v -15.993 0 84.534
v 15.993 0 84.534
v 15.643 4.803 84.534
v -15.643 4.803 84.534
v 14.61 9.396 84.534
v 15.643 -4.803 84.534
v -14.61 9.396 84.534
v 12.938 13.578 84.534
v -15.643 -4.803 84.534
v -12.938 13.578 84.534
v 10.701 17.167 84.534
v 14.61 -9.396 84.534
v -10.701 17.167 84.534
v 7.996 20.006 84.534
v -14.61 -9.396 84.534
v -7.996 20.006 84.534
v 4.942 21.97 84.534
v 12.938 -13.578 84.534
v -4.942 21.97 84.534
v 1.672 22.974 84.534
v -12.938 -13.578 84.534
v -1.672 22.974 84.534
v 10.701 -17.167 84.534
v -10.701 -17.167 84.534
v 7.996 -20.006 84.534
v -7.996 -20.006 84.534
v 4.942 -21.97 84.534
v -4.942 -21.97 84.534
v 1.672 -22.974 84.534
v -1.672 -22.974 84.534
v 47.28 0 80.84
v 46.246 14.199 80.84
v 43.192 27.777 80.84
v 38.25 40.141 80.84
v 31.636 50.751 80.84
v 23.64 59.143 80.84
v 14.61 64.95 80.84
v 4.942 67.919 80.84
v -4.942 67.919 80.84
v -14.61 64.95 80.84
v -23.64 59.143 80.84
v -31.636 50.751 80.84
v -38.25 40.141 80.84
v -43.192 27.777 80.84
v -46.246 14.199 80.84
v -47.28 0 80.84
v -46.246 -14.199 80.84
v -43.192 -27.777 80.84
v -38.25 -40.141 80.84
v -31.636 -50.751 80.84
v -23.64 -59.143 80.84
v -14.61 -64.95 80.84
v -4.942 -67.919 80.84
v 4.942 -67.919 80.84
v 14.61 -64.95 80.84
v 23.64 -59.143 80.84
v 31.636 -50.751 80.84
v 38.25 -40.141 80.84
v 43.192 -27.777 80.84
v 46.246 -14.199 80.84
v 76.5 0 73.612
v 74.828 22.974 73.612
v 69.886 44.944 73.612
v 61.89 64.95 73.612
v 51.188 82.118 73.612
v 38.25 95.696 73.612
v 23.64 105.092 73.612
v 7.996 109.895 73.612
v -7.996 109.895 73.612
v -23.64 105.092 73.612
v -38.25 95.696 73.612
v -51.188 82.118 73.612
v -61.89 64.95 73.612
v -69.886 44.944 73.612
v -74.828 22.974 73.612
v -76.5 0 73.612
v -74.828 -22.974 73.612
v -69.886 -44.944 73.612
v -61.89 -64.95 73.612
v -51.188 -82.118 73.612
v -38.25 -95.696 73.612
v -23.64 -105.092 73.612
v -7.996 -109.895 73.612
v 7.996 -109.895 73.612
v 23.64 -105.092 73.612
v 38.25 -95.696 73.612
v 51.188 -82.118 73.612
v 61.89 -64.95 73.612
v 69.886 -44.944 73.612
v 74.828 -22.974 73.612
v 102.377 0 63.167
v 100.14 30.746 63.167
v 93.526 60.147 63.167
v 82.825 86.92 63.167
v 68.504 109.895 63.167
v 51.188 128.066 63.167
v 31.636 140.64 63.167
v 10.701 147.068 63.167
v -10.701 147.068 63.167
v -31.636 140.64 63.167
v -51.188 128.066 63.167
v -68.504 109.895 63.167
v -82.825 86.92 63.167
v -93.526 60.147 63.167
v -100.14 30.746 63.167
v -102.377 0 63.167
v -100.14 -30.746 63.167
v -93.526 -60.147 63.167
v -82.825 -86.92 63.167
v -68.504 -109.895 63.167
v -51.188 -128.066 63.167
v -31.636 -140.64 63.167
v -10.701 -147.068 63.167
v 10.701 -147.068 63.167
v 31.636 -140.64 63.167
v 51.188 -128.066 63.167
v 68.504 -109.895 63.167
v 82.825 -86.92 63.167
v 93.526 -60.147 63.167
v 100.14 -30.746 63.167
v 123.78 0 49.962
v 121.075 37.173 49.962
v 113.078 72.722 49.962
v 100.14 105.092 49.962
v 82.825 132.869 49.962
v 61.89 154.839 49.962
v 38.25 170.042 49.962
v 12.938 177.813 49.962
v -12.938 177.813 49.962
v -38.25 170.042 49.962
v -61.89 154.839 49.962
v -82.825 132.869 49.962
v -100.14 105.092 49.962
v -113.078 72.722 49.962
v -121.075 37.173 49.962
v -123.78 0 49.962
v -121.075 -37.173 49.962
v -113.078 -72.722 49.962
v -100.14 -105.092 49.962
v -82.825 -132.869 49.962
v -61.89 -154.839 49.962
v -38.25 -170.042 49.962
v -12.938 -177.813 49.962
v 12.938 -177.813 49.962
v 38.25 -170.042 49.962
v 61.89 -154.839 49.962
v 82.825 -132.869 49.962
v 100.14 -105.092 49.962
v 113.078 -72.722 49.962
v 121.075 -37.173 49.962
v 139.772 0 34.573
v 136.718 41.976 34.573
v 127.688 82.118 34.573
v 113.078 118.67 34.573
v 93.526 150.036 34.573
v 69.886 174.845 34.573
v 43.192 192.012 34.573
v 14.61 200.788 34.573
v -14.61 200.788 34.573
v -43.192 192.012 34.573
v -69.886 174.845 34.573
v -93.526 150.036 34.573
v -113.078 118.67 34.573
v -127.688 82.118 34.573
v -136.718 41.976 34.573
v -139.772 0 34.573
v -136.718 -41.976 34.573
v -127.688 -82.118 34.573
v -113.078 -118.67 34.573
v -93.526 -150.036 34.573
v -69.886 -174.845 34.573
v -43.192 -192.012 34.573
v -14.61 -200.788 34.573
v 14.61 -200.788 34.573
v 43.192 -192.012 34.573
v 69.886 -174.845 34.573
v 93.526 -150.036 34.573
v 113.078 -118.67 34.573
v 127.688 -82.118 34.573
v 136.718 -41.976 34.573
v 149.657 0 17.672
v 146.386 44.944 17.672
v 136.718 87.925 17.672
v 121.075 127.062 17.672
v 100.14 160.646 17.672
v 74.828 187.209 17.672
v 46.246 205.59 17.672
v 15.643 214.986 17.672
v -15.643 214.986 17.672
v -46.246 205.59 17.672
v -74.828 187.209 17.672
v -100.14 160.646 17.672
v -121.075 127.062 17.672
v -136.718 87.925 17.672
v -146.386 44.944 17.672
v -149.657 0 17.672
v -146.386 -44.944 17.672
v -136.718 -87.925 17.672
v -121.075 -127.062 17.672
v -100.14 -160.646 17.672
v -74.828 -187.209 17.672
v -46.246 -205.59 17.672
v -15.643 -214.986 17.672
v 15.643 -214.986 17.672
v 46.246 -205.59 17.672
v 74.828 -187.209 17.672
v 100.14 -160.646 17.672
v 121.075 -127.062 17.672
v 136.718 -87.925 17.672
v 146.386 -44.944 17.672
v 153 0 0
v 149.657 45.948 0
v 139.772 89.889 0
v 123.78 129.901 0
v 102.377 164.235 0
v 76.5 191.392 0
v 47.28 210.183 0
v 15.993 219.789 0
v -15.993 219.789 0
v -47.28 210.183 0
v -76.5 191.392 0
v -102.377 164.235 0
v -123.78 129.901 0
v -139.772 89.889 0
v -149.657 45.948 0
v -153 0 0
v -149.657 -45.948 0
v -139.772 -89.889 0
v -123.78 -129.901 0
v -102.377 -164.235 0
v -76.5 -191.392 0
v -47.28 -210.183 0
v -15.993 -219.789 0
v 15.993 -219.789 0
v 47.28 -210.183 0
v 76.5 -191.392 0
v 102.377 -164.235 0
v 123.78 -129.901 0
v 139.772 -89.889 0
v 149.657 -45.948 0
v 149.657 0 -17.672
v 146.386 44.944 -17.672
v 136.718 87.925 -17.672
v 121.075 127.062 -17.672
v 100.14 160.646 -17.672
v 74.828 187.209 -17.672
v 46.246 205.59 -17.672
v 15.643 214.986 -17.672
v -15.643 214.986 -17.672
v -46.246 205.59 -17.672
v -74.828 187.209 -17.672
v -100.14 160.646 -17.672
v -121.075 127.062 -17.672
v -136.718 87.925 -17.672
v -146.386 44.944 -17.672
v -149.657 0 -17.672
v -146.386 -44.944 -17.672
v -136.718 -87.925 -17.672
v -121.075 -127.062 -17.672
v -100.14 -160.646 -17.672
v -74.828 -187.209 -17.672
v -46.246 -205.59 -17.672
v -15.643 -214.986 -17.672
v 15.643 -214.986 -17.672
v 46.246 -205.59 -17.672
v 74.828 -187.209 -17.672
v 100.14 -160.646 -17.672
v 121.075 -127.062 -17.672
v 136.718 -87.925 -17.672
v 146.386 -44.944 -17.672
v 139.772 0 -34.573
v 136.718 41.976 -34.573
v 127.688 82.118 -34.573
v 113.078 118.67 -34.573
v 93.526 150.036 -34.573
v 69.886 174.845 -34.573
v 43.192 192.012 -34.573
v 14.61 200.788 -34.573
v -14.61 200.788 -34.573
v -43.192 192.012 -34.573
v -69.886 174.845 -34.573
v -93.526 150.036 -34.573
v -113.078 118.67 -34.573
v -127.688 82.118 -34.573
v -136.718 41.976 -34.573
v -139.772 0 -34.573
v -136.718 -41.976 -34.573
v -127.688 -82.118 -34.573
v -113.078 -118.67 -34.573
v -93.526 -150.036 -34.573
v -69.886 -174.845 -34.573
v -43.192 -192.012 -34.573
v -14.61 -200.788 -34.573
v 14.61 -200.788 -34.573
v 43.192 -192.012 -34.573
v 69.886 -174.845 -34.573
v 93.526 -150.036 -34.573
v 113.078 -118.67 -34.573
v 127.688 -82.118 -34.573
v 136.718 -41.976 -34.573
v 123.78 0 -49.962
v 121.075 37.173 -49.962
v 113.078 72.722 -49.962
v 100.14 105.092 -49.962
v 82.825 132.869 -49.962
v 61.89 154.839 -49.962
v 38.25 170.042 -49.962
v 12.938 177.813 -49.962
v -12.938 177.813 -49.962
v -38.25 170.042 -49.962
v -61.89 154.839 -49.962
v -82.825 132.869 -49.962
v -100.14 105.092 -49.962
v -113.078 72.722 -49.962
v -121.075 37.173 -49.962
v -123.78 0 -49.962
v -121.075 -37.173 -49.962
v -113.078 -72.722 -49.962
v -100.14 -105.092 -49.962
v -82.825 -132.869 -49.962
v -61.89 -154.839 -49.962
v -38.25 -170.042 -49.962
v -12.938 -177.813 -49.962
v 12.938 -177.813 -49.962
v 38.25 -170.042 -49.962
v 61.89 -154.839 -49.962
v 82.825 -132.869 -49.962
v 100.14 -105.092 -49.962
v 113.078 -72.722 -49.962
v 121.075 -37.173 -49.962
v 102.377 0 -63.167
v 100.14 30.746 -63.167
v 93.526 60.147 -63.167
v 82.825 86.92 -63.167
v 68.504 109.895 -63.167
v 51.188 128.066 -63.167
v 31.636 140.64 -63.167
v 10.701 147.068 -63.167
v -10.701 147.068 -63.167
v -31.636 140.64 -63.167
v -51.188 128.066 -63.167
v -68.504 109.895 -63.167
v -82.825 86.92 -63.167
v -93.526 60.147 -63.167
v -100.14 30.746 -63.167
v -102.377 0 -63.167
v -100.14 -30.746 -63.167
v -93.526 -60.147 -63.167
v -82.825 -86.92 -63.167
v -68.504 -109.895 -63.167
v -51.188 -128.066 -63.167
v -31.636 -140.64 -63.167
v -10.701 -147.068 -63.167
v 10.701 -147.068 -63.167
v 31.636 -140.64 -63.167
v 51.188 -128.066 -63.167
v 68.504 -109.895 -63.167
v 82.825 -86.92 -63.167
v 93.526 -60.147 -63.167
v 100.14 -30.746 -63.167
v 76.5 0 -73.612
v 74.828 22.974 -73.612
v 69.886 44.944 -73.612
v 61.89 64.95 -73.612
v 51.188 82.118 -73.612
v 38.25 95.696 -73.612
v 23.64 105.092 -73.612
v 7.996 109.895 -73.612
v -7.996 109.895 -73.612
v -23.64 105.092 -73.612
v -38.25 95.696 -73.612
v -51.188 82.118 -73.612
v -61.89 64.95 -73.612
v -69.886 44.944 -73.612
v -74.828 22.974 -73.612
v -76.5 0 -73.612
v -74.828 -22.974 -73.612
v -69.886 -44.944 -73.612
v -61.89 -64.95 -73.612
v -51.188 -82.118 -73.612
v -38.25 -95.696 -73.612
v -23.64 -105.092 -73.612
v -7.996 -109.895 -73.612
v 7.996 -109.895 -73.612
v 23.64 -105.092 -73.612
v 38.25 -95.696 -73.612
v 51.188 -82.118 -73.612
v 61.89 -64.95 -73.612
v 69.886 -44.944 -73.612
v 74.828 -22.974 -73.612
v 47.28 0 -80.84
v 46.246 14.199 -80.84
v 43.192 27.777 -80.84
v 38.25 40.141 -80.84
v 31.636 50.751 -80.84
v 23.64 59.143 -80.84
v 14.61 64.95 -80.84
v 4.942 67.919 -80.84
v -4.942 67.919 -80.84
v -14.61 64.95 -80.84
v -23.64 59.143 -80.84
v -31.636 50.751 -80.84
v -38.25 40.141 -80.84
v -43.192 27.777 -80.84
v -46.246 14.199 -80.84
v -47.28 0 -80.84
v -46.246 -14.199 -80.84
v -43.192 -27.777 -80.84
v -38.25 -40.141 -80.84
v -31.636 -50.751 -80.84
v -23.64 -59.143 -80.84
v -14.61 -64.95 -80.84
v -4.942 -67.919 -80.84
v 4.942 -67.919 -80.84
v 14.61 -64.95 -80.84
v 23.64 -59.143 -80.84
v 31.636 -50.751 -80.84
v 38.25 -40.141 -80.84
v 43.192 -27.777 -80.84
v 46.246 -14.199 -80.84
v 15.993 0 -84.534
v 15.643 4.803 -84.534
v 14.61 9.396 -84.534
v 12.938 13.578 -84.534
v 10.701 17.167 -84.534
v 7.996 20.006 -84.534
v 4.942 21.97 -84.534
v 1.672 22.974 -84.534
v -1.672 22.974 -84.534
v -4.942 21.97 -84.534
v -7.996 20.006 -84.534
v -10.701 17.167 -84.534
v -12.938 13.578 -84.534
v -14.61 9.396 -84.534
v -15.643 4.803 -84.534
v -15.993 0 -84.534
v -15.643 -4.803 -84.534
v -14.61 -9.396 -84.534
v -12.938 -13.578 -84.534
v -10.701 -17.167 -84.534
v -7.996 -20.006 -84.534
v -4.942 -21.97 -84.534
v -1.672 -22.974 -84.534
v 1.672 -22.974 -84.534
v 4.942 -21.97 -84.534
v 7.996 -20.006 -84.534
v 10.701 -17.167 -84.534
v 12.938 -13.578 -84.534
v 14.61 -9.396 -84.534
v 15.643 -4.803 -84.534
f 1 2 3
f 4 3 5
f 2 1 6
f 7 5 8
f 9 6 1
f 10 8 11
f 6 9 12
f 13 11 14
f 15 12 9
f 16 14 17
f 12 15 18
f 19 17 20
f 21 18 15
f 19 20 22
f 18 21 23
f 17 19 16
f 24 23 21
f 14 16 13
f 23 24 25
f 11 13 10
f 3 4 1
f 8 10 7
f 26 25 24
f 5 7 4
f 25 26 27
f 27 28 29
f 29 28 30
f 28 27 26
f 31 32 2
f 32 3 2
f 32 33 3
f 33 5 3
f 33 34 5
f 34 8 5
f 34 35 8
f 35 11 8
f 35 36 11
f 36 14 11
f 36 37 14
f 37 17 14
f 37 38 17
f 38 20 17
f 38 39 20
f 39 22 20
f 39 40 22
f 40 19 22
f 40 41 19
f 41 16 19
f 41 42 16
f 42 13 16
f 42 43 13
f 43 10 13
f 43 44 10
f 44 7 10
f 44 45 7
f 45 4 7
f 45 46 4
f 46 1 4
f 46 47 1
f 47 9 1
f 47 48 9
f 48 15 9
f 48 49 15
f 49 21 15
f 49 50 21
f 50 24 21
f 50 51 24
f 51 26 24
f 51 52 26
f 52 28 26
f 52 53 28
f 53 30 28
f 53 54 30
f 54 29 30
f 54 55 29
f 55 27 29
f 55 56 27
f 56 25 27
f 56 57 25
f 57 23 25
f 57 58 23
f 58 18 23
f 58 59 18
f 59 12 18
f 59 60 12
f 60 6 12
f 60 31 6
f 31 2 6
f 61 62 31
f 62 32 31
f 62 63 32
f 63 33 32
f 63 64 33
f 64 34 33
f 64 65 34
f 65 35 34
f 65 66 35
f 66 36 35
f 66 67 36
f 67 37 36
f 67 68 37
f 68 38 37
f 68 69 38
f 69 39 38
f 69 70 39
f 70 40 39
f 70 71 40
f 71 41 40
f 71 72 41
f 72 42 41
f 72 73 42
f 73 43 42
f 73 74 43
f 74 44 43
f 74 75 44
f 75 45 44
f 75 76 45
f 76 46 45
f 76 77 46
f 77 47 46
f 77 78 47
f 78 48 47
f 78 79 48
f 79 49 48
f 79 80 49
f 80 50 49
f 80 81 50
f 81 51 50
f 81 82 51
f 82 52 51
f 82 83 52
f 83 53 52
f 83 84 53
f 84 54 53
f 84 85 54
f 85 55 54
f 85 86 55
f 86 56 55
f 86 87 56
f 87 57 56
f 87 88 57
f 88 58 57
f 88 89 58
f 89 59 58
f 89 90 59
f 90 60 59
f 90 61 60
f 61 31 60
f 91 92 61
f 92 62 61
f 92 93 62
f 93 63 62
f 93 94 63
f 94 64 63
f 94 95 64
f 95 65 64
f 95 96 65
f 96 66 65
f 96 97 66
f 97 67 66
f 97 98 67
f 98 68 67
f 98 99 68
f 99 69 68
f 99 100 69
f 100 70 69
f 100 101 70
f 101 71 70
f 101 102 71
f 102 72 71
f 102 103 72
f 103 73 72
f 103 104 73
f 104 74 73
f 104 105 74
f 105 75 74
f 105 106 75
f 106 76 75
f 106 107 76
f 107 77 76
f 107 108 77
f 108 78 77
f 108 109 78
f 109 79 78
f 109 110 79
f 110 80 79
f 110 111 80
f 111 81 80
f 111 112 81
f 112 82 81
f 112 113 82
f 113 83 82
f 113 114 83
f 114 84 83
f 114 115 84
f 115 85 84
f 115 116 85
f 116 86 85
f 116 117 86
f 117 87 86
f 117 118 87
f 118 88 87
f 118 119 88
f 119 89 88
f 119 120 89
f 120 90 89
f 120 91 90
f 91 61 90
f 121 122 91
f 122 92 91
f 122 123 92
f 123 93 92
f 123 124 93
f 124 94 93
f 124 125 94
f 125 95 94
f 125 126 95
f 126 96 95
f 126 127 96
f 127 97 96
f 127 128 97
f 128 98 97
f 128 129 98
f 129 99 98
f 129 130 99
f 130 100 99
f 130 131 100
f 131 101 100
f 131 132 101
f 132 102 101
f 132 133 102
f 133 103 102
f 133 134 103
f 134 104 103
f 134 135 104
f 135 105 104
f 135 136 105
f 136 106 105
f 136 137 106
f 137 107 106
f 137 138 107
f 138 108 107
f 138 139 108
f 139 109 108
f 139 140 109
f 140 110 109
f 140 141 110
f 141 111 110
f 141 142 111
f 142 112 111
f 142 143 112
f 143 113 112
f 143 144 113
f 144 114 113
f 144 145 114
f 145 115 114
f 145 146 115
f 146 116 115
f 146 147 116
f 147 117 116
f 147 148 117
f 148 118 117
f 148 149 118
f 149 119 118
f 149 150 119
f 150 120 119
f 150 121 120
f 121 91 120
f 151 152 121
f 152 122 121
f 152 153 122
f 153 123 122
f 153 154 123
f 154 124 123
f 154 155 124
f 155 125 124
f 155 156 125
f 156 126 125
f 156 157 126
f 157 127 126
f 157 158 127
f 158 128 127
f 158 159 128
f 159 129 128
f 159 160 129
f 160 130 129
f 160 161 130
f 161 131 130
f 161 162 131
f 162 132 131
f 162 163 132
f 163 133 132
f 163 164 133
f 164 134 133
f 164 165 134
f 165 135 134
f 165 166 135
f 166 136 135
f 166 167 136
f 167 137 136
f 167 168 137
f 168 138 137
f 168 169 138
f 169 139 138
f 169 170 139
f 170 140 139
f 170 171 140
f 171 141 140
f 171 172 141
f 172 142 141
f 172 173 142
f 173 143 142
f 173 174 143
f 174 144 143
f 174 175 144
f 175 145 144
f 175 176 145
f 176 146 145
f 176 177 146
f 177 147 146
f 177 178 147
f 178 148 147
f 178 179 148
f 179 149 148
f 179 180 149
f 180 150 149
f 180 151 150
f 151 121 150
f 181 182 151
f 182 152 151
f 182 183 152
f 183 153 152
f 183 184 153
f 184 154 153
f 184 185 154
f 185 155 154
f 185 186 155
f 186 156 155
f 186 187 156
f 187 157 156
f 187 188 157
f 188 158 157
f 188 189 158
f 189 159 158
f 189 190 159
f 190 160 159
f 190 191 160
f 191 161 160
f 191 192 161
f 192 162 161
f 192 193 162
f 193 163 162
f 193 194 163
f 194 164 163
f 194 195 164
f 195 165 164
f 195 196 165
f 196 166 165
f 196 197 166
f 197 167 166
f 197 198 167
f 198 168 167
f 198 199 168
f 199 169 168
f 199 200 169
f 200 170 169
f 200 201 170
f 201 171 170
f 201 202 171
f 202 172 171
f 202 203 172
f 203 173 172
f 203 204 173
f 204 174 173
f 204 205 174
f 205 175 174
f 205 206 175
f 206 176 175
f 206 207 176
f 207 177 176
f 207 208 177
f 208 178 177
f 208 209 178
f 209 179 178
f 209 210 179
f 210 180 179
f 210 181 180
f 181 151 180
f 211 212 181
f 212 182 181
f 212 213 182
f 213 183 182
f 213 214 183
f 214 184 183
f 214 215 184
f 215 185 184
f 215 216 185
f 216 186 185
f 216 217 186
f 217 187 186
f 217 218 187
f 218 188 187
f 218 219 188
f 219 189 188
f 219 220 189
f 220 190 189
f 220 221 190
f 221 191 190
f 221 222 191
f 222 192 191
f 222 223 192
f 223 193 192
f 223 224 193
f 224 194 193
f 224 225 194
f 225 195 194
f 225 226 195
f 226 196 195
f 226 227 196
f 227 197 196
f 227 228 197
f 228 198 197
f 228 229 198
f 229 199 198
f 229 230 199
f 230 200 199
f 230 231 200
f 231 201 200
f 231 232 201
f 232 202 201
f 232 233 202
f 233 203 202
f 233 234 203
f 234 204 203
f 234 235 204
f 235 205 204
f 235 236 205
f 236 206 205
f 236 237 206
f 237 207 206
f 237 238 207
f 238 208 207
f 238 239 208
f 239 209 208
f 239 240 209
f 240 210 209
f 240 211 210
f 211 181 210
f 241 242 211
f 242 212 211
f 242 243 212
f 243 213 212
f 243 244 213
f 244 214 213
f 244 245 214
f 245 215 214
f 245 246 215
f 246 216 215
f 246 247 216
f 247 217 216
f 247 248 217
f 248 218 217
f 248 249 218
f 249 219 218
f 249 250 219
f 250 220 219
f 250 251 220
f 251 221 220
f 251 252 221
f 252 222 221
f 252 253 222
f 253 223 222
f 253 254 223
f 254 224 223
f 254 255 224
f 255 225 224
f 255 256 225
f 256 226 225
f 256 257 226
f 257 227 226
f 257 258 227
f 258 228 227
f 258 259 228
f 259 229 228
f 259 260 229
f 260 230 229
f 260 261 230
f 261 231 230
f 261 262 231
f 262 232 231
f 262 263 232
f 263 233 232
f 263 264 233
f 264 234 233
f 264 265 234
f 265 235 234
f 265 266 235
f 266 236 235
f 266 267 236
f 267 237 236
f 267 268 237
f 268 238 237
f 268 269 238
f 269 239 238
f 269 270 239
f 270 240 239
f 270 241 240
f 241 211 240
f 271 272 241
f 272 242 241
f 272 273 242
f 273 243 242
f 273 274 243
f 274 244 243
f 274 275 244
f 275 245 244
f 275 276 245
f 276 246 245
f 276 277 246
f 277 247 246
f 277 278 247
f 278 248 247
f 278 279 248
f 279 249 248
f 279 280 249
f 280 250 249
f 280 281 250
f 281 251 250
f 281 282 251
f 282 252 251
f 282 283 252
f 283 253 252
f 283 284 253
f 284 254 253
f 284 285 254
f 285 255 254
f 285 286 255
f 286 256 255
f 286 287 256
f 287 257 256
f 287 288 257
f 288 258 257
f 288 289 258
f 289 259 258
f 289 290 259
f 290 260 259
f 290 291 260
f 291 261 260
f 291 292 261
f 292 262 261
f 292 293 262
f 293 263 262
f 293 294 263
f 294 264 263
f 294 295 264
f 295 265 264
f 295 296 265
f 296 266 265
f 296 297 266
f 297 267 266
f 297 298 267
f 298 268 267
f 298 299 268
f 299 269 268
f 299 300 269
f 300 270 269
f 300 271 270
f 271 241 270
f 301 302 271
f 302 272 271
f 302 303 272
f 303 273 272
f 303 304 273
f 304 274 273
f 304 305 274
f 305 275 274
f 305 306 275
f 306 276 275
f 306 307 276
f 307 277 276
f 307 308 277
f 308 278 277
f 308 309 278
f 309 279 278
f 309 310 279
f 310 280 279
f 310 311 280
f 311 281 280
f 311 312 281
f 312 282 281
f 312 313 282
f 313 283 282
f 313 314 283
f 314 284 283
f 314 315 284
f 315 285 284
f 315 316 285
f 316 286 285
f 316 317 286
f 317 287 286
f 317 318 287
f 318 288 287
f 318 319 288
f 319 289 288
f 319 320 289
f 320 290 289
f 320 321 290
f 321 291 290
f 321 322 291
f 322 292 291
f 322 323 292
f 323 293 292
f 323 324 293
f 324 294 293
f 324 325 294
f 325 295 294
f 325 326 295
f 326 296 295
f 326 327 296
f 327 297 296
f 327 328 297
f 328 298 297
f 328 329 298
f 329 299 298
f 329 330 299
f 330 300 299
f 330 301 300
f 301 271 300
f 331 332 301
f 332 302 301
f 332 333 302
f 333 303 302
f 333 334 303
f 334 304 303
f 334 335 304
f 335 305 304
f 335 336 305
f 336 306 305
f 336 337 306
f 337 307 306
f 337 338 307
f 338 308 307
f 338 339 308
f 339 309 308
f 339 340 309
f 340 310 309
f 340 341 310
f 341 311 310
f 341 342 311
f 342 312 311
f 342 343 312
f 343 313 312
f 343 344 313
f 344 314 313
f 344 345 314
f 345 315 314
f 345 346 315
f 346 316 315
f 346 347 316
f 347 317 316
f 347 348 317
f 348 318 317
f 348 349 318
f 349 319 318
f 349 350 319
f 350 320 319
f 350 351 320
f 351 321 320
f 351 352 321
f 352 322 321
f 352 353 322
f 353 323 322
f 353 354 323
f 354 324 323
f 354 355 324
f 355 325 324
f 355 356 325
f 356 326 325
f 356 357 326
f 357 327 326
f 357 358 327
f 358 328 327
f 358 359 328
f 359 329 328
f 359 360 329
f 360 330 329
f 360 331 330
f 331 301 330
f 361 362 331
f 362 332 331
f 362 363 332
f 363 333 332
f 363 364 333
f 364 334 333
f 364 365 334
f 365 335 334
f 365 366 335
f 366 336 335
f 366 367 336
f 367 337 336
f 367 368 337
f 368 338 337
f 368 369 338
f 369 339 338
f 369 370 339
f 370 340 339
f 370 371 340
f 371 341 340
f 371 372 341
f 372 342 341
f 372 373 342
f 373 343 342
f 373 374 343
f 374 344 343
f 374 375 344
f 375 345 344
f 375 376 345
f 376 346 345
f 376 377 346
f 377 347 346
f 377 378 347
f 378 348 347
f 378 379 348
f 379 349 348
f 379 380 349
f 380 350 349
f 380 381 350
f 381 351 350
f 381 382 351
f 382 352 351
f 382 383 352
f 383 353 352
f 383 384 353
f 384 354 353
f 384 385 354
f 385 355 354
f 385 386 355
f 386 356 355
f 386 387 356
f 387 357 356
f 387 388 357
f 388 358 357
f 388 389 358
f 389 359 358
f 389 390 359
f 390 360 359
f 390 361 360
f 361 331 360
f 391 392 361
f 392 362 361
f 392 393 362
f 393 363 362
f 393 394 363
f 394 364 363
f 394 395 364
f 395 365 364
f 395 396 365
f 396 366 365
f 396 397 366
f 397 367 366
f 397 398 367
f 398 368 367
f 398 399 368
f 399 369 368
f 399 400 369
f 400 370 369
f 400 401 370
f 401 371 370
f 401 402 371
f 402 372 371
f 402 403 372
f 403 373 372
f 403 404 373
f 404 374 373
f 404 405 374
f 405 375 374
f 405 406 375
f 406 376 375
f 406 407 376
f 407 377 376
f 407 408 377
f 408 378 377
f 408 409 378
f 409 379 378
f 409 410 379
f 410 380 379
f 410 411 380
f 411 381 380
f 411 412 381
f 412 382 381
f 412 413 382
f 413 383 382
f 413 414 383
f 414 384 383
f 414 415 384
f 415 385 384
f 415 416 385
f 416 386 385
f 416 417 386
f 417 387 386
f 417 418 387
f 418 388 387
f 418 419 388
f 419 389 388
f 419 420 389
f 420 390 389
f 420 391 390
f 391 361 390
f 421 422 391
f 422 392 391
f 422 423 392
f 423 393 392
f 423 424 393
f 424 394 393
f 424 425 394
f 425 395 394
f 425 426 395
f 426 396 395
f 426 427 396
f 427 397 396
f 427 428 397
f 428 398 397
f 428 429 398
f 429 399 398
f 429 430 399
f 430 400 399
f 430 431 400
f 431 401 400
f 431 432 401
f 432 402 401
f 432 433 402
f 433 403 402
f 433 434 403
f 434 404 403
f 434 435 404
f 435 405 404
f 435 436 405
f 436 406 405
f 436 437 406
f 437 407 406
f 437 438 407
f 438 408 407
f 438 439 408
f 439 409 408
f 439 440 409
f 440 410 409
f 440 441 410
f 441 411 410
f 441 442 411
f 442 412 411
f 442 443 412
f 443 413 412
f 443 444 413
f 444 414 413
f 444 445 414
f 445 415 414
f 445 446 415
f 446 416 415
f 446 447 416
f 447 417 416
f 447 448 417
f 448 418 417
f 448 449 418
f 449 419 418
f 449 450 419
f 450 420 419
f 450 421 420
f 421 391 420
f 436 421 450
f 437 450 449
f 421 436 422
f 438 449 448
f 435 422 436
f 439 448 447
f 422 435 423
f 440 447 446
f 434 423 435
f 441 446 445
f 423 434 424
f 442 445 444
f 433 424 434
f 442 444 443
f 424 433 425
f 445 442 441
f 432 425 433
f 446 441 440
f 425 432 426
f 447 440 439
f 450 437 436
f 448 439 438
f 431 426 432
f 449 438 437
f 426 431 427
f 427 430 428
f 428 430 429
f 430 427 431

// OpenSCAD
// Generated by SolidPython 1.0.1 on 2020-07-29 00:46:48


scale(v = [9, 13, 5]) {
	sphere(r = 17);
}
/***********************************************
*********      SolidPython code:      **********
************************************************
 
# import packages: SolidPython
from solid import *
from solid.utils import *
from itertools import chain, combinations, permutations


class Resize:

    def __init__(self, scad_file):
        self.scad_file = scad_file
        #self.scad_file = import_scad(scad_file)
        # cone/cylinder param:
        self.r1 = 0
        self.r2 = 0
        self.h = 0
        # rectangular prism param:
        self.w = 0
        self.l = 0
        # ellipse param:
        self.r = 0

    # import OpenScad code (file name corresponds to shape)


    # classify shape + parameters
    def assign(self, param1, param2, param3):
        if self.scad_file == 'cone.scad':
            self.r1 = param1
            self.r2 = param2
            self.h = param3
        elif self.scad_file == 'cylinder.scad':
            self.r1 = param1
            self.r2 = param2
            self.h = param3
        elif self.scad_file == 'rectangularPrism.scad':
            self.h = param1
            self.l = param2
            self.w = param3
        else:
            self.r = param1
            self.h = param2

    # resize parameters
    def iterate(self):
        x = range(3, 20, 2)
        i = 1
        if self.scad_file == 'cone.scad':
            tempList = list(permutations(x, 2))
            for temp in tempList:
                param1 = temp[0]
                param2 = temp[1]
                filepath = 'produced_scad_files/' + 'cone' + str(param1) + '_' + str(param2) + '_' + '.scad'
                scad_render_to_file(cylinder(h=param1, r1=param2, r2=0), filepath)

        elif self.scad_file == 'cylinder.scad':
            tempList = list(permutations(x, 3))
            for temp in tempList:
                param1 = temp[0]
                param2 = temp[1]
                filepath = 'produced_scad_files/' + 'cylinder' + str(param1) + '_' + str(param2) + '_' + '.scad'
                scad_render_to_file(cylinder(h=param1, r1=param2, r2=param2), filepath)

        elif self.scad_file == 'rectangularPrism.scad':
            tempList = list(permutations(x, 3))
            for temp in tempList:
                param1 = temp[0]
                param2 = temp[1]
                param3 = temp[2]
                filepath = 'produced_scad_files/' + 'rectangularPrism' + str(param1) + '_' + str(param2) + '_' + str(
                    param3) + '.scad'
                scad_render_to_file(cube(size=(param1, param2, param3)), filepath)

        elif self.scad_file == 'ellipse.scad':
            tempList = list(permutations(x, 4))
            for temp in tempList:
                param1 = temp[0]
                param2 = temp[1]
                param3 = temp[2]
                param4 = temp[3]
                filepath = 'produced_scad_files/' + 'ellipse' + str(param1) + '_' + str(param2) + '_' + str(param3) + '_' + str(param4) + '.scad'
                scad_render_to_file(scale([param1, param2, param3])(sphere(r=param4)), filepath)

    def render_to_scadfile(self):
        scad_render_to_file(scad, 'example.scad') 
 
************************************************/
